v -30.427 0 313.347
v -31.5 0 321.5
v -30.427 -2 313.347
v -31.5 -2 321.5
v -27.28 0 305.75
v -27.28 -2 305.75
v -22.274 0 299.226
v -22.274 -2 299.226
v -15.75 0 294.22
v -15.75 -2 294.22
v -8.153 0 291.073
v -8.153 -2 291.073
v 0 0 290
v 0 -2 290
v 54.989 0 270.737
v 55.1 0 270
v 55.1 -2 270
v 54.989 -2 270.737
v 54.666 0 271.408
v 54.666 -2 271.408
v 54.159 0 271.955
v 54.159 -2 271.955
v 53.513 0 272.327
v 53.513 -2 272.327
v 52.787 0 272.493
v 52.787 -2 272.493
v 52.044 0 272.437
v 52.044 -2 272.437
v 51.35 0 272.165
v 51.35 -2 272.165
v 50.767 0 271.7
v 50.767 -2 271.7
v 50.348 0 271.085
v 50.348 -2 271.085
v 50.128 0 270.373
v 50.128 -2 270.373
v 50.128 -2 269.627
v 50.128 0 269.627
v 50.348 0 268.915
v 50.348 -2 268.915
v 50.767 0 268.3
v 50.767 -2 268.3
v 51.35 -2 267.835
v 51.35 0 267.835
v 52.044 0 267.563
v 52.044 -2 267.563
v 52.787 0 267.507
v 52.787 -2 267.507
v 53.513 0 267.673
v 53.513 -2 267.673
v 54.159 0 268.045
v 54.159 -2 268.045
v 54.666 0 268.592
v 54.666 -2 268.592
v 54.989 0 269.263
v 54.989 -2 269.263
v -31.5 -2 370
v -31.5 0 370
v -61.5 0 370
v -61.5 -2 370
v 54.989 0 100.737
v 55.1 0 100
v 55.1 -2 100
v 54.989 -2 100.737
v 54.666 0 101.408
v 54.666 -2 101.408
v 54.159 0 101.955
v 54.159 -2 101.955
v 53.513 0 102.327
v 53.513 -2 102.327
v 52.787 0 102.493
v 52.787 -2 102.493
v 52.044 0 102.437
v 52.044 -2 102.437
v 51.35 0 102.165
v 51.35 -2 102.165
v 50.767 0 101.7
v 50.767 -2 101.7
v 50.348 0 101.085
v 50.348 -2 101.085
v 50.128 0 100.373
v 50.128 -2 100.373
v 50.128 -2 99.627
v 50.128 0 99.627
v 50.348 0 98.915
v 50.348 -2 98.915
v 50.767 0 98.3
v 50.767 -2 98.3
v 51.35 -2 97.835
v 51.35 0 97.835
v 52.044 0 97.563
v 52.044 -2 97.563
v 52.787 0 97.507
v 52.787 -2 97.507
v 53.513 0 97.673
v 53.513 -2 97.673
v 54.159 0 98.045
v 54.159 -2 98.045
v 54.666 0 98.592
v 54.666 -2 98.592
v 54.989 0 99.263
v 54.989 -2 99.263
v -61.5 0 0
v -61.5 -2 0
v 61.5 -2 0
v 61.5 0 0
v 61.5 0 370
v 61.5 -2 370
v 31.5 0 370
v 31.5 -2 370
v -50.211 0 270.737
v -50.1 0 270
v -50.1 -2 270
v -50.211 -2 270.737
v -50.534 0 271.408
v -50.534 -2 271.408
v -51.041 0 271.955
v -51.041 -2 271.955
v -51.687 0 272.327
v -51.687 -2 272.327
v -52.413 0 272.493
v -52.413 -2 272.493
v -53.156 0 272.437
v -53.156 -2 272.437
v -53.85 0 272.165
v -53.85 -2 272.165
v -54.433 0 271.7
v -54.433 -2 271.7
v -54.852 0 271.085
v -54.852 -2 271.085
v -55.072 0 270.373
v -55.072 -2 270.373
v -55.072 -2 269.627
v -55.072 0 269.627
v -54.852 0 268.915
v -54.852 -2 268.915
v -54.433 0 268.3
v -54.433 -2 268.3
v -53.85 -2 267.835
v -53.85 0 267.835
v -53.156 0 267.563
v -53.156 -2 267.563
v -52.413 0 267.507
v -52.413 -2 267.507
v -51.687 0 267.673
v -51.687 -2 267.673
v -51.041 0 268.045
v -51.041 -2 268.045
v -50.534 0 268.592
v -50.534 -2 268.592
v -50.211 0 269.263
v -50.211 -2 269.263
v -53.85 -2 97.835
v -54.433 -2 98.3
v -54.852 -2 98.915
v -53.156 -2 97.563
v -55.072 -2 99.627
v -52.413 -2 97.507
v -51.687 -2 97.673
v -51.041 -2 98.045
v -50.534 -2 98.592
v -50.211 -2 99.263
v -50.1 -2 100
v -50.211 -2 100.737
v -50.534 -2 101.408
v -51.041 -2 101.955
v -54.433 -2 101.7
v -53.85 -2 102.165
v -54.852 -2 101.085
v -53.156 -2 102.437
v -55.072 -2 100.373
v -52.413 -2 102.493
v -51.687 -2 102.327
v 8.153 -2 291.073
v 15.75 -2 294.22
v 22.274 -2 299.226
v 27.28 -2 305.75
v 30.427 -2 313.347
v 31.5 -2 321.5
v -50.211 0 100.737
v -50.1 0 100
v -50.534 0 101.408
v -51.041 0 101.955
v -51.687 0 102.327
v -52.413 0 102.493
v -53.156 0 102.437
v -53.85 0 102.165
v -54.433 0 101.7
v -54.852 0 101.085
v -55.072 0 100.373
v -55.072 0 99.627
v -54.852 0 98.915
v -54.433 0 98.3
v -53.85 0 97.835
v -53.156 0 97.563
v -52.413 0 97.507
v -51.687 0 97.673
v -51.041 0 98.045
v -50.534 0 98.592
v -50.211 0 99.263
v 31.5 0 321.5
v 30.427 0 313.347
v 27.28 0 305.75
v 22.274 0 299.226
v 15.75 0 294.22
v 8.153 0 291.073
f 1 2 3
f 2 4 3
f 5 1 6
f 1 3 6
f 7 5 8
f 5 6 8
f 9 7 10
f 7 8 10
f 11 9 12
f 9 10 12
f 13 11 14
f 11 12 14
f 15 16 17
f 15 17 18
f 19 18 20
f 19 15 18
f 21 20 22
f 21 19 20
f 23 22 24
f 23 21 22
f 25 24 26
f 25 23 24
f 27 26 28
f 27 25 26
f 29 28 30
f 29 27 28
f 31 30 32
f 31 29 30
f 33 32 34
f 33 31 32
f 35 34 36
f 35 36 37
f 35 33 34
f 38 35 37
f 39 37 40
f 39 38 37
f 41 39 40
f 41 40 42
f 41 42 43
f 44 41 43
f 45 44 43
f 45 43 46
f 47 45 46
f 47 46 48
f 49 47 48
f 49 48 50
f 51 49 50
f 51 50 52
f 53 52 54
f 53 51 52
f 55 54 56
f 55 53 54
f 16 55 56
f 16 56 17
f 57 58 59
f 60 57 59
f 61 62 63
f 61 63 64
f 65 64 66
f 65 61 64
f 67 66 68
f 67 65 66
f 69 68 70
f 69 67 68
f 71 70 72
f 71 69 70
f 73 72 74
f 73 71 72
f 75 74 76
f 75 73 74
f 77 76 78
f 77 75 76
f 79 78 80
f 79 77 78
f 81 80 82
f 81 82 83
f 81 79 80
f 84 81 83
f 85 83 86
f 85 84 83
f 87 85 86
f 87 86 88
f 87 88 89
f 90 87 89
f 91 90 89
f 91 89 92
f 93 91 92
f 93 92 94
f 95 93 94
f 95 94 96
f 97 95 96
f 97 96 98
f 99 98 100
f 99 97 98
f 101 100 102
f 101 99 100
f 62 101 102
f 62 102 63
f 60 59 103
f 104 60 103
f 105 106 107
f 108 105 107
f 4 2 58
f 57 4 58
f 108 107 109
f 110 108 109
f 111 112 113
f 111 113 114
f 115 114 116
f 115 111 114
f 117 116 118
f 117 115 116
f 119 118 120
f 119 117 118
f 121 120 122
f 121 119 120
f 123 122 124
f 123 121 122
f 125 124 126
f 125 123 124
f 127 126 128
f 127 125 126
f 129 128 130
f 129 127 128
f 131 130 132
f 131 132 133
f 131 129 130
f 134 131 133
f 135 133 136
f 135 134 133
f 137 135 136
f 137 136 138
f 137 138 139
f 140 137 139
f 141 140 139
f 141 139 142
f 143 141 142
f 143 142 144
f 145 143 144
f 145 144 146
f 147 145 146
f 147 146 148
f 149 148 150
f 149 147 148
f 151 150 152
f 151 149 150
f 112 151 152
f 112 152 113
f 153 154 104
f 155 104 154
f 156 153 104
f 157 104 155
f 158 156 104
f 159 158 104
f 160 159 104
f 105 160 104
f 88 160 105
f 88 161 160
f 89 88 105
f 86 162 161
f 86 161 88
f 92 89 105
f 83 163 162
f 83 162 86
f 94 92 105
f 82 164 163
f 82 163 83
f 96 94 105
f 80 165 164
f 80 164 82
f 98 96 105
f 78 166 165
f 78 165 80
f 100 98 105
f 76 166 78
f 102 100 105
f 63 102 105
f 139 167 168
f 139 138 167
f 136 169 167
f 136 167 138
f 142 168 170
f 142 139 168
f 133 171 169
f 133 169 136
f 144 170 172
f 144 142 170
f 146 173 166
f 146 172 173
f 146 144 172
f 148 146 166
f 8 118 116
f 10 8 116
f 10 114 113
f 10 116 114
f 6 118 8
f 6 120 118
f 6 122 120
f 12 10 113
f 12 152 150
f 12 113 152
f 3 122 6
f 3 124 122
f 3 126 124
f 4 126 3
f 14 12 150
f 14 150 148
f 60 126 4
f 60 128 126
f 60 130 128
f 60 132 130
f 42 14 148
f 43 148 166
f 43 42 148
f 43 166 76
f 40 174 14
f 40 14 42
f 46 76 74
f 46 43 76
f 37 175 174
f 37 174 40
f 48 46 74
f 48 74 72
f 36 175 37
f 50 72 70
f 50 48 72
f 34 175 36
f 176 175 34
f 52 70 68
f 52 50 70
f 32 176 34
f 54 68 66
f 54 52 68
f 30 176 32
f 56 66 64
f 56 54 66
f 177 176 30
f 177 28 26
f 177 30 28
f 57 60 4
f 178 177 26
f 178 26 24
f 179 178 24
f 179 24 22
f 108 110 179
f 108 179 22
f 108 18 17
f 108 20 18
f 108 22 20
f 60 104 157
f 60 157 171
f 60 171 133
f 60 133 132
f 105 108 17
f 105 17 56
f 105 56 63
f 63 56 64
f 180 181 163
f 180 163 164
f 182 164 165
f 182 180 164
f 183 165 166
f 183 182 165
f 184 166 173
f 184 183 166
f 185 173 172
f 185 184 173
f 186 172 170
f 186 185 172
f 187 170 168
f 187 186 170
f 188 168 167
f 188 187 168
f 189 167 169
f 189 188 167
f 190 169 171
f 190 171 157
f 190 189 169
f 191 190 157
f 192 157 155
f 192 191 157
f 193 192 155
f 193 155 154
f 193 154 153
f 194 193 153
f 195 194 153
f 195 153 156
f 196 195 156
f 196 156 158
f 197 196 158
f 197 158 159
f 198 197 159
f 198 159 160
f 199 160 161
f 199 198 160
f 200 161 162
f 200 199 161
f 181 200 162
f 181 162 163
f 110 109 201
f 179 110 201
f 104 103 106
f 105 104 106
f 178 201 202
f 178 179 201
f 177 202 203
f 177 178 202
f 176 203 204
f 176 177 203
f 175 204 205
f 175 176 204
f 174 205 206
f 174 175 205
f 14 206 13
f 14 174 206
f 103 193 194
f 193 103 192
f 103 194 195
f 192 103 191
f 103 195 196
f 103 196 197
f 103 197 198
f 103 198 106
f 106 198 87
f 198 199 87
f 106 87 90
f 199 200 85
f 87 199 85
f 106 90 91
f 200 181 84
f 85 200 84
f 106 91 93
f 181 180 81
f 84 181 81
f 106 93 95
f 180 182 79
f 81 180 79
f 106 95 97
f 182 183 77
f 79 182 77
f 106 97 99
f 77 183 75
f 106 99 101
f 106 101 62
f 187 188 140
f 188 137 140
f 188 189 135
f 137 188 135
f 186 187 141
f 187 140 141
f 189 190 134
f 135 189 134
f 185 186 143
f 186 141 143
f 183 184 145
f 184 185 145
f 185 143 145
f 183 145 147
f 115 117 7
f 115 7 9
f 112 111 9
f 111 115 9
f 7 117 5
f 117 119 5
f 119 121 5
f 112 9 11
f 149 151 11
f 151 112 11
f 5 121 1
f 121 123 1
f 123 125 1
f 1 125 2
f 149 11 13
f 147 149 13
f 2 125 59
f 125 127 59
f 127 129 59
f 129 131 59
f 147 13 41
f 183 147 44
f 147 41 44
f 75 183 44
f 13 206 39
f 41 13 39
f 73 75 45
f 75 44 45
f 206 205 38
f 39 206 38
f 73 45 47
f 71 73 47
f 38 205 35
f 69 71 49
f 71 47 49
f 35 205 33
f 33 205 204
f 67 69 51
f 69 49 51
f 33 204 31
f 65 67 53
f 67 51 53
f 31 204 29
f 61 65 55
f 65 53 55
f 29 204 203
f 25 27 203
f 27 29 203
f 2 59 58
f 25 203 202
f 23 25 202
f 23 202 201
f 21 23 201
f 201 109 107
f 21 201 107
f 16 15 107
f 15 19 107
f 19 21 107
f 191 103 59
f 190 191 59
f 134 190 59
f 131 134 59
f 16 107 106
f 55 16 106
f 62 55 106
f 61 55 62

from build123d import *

# Parameters (mm, degrees)
F0_R     = 2.5
F1_DEPTH = 2
F2_R     = 31.49999


# Not quite as in the source:
# - a fillet or chamfer is up to 0.001 mm smaller than in the source, because OpenCascade refuses the exact size


with BuildPart() as f1:
    # F0 (on Front) → F1 (new body)
    with BuildSketch(Plane.XZ):
        Polygon((-61.5, 0), (0, 0), (61.5, 0), (61.5, 370), (31.5, 370), (31.5, 290), (5.5, 290), (-5.5, 290), (-31.5, 290), (-31.5, 370), (-61.5, 370), align=None)
        with Locations((-52.6, 100)):
            Circle(F0_R, mode=Mode.SUBTRACT)
        with Locations((52.6, 100)):
            Circle(F0_R, mode=Mode.SUBTRACT)
        with Locations((-52.6, 270)):
            Circle(F0_R, mode=Mode.SUBTRACT)
        with Locations((52.6, 270)):
            Circle(F0_R, mode=Mode.SUBTRACT)
    extrude(amount=F1_DEPTH)

    # F2 (radius 31.5 in the source; OpenCascade refuses exactly that, so slightly less here)
    f2_edges = [f1.edges().sort_by_distance(p)[0] for p in [
        (-31.5, -1, 290),
        (31.5, -1, 290),
    ]]
    fillet(f2_edges, radius=F2_R)


solid = f1.part
